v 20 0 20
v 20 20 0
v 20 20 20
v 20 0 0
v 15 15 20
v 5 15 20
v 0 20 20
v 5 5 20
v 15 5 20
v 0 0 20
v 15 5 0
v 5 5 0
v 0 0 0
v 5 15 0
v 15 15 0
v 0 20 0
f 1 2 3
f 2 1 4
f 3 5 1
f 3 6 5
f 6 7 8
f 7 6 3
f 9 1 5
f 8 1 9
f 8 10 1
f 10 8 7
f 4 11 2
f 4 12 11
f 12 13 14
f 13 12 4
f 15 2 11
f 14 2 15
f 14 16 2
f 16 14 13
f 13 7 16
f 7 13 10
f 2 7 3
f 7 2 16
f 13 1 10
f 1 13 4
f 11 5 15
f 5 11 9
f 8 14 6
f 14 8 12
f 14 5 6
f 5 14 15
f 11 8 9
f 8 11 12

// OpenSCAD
// Edge length of the cube.
edge_size = 20;
hole_size = edge_size / 2;

// Cut a centered square hole vertically through the cube.
difference() {
    cube([edge_size, edge_size, edge_size]);

    translate([
        (edge_size - hole_size) / 2,
        (edge_size - hole_size) / 2,
        -1
    ])
        cube([hole_size, hole_size, edge_size + 2]);
}
